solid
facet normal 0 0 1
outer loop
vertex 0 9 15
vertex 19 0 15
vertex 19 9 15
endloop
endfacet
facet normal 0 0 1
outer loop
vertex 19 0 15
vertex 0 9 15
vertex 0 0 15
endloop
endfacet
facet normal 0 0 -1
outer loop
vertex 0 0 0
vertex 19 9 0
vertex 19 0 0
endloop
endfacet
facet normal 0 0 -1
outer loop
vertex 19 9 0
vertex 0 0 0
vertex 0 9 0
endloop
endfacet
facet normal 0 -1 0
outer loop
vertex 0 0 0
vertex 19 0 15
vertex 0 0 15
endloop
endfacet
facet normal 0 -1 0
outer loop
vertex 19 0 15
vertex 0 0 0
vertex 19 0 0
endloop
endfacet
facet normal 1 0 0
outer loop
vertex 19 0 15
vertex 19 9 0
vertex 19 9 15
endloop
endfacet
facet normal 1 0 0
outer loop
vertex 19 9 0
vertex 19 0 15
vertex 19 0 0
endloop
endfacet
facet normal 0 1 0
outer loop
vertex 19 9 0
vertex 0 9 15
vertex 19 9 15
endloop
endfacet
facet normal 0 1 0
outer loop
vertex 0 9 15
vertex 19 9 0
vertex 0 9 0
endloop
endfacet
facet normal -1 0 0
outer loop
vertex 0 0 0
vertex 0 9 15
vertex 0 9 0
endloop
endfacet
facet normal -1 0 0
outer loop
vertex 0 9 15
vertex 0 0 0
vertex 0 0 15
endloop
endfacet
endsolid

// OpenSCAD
// Generated by SolidPython 1.0.1 on 2020-07-29 00:46:56


cube(size = [19, 9, 15]);
/***********************************************
*********      SolidPython code:      **********
************************************************
 
# import packages: SolidPython
from solid import *
from solid.utils import *
from itertools import chain, combinations, permutations


class Resize:

    def __init__(self, scad_file):
        self.scad_file = scad_file
        #self.scad_file = import_scad(scad_file)
        # cone/cylinder param:
        self.r1 = 0
        self.r2 = 0
        self.h = 0
        # rectangular prism param:
        self.w = 0
        self.l = 0
        # ellipse param:
        self.r = 0

    # import OpenScad code (file name corresponds to shape)


    # classify shape + parameters
    def assign(self, param1, param2, param3):
        if self.scad_file == 'cone.scad':
            self.r1 = param1
            self.r2 = param2
            self.h = param3
        elif self.scad_file == 'cylinder.scad':
            self.r1 = param1
            self.r2 = param2
            self.h = param3
        elif self.scad_file == 'rectangularPrism.scad':
            self.h = param1
            self.l = param2
            self.w = param3
        else:
            self.r = param1
            self.h = param2

    # resize parameters
    def iterate(self):
        x = range(3, 20, 2)
        i = 1
        if self.scad_file == 'cone.scad':
            tempList = list(permutations(x, 2))
            for temp in tempList:
                param1 = temp[0]
                param2 = temp[1]
                filepath = 'produced_scad_files/' + 'cone' + str(param1) + '_' + str(param2) + '_' + '.scad'
                scad_render_to_file(cylinder(h=param1, r1=param2, r2=0), filepath)

        elif self.scad_file == 'cylinder.scad':
            tempList = list(permutations(x, 3))
            for temp in tempList:
                param1 = temp[0]
                param2 = temp[1]
                filepath = 'produced_scad_files/' + 'cylinder' + str(param1) + '_' + str(param2) + '_' + '.scad'
                scad_render_to_file(cylinder(h=param1, r1=param2, r2=param2), filepath)

        elif self.scad_file == 'rectangularPrism.scad':
            tempList = list(permutations(x, 3))
            for temp in tempList:
                param1 = temp[0]
                param2 = temp[1]
                param3 = temp[2]
                filepath = 'produced_scad_files/' + 'rectangularPrism' + str(param1) + '_' + str(param2) + '_' + str(
                    param3) + '.scad'
                scad_render_to_file(cube(size=(param1, param2, param3)), filepath)

        elif self.scad_file == 'ellipse.scad':
            tempList = list(permutations(x, 4))
            for temp in tempList:
                param1 = temp[0]
                param2 = temp[1]
                param3 = temp[2]
                param4 = temp[3]
                filepath = 'produced_scad_files/' + 'ellipse' + str(param1) + '_' + str(param2) + '_' + str(param3) + '_' + str(param4) + '.scad'
                scad_render_to_file(scale([param1, param2, param3])(sphere(r=param4)), filepath)

    def render_to_scadfile(self):
        scad_render_to_file(scad, 'example.scad') 
 
************************************************/
